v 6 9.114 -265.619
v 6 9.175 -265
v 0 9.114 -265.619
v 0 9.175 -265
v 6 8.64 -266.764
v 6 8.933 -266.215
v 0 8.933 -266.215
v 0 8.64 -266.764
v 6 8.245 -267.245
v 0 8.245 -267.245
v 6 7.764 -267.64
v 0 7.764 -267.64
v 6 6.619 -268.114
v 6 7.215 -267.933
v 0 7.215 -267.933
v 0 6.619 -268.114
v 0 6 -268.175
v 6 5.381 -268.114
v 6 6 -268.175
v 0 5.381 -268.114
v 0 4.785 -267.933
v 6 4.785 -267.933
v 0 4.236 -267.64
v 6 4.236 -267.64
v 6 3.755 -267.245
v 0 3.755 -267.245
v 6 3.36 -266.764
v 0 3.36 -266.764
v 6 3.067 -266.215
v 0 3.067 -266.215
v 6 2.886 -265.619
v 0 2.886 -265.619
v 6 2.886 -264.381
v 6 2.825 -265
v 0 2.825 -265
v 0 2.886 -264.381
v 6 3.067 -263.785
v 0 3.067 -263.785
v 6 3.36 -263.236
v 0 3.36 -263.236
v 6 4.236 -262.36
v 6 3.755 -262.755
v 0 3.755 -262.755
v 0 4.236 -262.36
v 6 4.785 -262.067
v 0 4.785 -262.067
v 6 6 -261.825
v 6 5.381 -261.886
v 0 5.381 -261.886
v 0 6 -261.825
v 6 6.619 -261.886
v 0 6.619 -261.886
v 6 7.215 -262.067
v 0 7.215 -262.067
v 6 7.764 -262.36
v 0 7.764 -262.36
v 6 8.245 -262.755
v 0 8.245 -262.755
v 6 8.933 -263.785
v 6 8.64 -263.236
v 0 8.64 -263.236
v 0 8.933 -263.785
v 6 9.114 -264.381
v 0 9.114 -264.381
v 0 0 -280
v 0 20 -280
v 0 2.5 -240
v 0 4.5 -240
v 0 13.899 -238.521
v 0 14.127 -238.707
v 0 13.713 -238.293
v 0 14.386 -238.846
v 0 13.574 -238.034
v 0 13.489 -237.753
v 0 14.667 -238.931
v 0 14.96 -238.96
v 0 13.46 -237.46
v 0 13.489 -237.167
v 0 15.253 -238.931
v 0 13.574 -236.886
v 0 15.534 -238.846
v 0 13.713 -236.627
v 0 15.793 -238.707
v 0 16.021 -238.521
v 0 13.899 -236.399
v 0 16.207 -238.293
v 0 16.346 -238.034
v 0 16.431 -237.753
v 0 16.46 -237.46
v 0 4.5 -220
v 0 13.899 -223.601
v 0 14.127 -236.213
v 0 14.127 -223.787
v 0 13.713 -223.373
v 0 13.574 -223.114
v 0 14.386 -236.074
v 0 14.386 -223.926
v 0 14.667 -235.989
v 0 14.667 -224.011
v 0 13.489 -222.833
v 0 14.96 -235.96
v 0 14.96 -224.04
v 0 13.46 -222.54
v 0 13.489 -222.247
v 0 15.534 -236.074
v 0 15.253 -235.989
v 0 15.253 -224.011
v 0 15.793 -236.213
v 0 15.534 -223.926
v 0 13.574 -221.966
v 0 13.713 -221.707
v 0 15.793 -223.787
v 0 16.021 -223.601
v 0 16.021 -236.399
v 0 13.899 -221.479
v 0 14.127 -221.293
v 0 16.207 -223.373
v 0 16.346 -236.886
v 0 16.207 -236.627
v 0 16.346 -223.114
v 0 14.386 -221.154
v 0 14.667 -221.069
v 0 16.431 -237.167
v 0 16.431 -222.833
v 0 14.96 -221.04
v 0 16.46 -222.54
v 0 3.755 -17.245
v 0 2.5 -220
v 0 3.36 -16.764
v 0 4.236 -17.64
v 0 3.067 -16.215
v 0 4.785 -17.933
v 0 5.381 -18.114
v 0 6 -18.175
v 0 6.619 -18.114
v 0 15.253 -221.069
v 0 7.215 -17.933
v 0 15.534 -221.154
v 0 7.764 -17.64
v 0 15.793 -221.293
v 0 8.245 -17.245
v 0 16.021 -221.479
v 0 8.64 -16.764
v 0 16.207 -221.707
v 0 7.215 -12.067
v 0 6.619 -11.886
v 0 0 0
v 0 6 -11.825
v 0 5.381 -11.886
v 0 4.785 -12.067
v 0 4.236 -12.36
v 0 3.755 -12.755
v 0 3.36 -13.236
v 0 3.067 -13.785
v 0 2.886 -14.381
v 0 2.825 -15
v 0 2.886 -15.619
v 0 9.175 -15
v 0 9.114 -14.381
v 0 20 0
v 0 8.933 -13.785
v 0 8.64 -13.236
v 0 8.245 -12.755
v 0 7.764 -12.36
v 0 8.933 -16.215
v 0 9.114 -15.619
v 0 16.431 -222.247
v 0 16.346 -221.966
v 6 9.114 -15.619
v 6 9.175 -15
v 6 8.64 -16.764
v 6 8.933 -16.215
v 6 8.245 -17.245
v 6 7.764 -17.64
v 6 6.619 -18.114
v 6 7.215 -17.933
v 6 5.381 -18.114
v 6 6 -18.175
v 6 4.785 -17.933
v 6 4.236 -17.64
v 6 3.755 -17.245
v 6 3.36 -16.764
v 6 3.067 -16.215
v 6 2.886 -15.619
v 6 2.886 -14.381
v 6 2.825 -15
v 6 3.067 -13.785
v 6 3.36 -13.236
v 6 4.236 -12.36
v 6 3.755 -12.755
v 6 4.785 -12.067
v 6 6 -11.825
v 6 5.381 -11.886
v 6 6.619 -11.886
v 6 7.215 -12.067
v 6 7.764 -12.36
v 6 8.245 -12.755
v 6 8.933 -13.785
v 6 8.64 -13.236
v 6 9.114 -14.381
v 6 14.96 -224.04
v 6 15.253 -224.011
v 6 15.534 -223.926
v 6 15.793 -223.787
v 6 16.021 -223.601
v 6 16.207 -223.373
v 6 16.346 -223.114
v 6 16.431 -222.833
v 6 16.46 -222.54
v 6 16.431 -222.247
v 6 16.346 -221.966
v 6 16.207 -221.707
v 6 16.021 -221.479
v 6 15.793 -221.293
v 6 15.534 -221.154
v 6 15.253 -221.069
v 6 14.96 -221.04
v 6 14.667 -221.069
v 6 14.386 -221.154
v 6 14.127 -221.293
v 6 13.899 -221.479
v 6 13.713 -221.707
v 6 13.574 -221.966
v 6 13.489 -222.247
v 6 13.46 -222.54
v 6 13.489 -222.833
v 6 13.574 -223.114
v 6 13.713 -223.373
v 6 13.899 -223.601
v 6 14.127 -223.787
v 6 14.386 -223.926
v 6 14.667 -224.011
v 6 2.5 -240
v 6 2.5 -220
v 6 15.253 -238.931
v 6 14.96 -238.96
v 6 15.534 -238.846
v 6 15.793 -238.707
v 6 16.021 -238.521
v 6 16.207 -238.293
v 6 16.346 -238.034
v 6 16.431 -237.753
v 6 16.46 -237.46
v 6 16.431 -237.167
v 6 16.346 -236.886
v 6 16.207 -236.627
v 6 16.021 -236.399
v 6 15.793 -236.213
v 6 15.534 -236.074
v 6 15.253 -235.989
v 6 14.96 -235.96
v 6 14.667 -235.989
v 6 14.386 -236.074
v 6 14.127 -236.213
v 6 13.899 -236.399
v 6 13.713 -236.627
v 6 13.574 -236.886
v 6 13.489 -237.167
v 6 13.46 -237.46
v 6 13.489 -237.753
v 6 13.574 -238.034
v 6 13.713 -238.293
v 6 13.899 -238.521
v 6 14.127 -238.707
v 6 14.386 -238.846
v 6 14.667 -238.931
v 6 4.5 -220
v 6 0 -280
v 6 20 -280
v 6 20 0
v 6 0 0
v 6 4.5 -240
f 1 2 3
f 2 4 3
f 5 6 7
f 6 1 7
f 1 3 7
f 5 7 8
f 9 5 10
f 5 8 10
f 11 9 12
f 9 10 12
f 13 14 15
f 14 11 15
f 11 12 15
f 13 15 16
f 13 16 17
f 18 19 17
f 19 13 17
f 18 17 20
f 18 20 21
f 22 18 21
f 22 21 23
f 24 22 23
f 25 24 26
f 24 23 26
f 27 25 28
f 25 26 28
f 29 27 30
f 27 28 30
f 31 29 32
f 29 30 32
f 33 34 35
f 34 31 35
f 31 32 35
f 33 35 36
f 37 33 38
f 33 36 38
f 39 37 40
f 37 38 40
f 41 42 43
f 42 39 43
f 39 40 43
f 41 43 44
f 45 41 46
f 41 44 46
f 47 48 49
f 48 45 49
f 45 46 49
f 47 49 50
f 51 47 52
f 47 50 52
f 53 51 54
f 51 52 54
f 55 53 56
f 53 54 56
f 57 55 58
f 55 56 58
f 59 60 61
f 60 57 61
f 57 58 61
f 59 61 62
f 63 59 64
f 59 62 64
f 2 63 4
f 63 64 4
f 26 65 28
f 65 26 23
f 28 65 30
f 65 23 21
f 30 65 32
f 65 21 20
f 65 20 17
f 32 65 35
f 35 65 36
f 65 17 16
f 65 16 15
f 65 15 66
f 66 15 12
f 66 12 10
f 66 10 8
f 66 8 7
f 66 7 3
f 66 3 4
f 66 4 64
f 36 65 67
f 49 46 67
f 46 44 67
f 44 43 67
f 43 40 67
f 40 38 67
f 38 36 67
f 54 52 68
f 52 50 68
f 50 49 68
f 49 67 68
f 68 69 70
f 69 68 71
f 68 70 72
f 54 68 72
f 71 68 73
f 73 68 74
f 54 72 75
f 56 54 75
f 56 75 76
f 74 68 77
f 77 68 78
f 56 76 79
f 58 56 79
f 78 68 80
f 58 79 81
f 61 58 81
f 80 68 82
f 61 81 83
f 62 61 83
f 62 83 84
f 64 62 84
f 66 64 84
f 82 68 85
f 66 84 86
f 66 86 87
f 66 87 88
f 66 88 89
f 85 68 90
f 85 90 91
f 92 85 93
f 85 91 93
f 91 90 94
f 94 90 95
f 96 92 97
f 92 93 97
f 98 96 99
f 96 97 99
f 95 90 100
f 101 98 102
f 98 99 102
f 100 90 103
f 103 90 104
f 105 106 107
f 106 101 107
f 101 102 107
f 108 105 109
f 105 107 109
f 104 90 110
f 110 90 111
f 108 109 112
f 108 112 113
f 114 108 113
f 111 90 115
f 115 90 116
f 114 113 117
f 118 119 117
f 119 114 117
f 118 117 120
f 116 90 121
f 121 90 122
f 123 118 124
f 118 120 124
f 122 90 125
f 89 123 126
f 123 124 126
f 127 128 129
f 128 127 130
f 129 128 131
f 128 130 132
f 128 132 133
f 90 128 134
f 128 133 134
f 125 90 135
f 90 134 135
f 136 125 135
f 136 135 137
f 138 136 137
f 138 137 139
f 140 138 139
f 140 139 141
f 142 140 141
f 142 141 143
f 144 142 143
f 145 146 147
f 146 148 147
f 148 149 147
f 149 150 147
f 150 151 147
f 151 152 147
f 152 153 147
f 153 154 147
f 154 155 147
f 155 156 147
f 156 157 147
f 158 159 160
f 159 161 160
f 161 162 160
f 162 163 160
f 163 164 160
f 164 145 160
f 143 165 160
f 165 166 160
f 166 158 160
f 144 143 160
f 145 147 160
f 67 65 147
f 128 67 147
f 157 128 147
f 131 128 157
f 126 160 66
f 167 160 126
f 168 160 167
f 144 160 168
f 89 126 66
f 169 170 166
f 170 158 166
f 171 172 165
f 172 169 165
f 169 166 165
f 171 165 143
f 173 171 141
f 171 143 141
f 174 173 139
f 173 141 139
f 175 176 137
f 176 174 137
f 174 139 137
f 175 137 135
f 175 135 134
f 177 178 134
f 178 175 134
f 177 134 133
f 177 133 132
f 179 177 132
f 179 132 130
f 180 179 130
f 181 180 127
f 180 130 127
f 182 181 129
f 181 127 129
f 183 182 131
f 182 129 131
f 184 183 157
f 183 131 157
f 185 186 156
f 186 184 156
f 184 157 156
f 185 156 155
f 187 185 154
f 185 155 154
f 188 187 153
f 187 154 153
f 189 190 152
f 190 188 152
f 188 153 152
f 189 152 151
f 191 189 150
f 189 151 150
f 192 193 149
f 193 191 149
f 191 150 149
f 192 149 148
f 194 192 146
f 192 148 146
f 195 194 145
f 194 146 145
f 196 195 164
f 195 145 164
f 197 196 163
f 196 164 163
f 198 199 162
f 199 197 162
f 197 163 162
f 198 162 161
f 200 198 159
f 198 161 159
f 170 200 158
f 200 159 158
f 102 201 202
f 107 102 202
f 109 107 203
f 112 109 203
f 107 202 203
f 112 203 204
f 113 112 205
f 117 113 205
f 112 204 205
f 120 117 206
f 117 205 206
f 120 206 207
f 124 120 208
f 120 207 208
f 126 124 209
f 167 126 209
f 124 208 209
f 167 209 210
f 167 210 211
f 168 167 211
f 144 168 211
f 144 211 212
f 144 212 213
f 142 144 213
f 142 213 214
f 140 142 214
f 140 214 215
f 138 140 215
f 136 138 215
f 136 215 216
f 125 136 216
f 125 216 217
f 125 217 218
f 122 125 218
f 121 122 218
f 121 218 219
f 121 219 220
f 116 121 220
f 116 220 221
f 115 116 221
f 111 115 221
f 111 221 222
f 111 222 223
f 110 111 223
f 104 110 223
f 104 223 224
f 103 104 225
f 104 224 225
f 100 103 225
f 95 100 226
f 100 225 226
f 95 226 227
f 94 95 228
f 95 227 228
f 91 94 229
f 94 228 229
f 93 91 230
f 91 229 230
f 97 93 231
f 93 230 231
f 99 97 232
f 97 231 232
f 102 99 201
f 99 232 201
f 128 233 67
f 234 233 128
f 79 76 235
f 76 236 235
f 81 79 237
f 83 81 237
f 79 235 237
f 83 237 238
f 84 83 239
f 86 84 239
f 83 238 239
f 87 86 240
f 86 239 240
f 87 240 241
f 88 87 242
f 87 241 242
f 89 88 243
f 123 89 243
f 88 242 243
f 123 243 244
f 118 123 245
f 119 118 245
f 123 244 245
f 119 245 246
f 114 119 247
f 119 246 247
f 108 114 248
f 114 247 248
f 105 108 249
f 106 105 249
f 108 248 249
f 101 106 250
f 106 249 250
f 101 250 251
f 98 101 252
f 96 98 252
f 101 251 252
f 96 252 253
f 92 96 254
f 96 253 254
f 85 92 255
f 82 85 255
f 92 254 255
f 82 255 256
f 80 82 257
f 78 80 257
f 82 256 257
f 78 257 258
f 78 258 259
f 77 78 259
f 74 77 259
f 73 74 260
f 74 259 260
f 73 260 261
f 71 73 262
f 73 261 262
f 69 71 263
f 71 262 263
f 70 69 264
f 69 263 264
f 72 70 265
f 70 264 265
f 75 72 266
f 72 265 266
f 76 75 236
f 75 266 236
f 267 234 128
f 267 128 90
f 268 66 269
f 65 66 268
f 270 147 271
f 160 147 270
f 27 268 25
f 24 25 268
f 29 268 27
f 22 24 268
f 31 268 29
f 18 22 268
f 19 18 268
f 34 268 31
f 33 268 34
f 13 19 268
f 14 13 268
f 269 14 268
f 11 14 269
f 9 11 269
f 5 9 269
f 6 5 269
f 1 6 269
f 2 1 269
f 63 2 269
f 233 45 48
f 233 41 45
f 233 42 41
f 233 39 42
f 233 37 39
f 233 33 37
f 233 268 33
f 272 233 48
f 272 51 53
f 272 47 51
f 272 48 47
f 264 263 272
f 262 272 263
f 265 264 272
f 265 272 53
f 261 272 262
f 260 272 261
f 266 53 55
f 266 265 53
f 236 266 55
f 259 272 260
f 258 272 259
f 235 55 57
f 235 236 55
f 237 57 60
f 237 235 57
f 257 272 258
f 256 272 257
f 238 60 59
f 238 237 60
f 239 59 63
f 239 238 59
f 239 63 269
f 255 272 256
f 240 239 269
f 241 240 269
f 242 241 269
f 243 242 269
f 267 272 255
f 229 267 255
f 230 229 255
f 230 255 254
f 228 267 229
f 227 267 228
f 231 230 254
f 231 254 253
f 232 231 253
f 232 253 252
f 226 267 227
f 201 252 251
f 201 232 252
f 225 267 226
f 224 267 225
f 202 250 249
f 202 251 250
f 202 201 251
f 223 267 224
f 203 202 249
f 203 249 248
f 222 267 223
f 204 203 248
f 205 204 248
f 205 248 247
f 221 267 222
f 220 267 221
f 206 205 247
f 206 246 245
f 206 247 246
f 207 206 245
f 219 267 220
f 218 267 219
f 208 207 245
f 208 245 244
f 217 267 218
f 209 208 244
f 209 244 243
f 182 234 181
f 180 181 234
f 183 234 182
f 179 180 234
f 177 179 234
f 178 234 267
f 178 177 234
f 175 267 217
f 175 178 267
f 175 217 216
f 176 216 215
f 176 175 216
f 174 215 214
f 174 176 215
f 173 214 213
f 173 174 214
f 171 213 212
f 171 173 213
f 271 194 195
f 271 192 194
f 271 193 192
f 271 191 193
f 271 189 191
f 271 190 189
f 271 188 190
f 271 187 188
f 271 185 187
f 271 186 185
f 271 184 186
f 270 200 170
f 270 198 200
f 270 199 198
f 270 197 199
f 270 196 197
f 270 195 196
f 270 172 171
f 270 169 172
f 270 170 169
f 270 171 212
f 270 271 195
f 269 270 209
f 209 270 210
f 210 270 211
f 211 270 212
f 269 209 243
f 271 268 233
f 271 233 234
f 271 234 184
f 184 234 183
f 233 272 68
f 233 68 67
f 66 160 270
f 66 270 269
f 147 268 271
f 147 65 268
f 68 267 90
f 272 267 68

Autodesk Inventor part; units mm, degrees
ref_plane "YZ Plane" through (0, 0, 0) normal (1, 0, 0) x (0, 1, 0)
ref_plane "XZ Plane" through (0, 0, 0) normal (0, 1, 0) x (-1, 0, 0)
ref_plane "XY Plane" through (0, 0, 0) normal (0, 0, 1) x (1, 0, 0)
sketch "Boceto1" plane through (0, 0, 0) normal (1, 0, 0) x (0, 1, 0)
  line L0 (0, 0) -> (20, 0)
  line L1 (20, 0) -> (20, -280)
  line L2 (20, -280) -> (0, -280)
  line L3 (0, -280) -> (0, 0)
  circle A0 centre (6, -15) radius 3.175
  circle A1 centre (6, -265) radius 3.175
  dimension "d0" = 20
  dimension "d1" = 280
  dimension "d2" = 6.35
  dimension "d8" = 6
  dimension "d9" = 250
  dimension "d10" = 15
extrude "Extrusión1" add sketch "Boceto1" along normal blind 6
sketch "Boceto2" plane through (6, 0, 0) normal (1, 0, 0) x (0, 0, -1)
  line L0 (220, 17.5) -> (240, 17.5)
  line L1 (240, 17.5) -> (240, 2.5)
  line L2 (240, 2.5) -> (220, 2.5)
  line L3 (220, 2.5) -> (220, 17.5)
  line L4 (280, 0) -> (280, 20) projected
  line L5 (240, 2.5) -> (220, 2.5)
  line L6 (220, 2.5) -> (220, 4.5)
  line L7 (220, 4.5) -> (240, 4.5)
  line L8 (240, 4.5) -> (240, 2.5)
  circle A0 centre (222.54, 14.96) radius 1.5
  line L9 (230, 17.5) -> (230, 4.5)
  circle A1 centre (237.46, 14.96) radius 1.5
  point P0 (0, 0)
  point P1 (240, 10)
  point P2 (280, 10)
  dimension "d11" = 20
  dimension "d12" = 15
  dimension "d13" = 40
  dimension "d14" = 2
  dimension "d15" = 3
  dimension "d16" = 2.54
  dimension "d17" = 2.54
extrude "Extrusión2" cut sketch "Boceto2" against normal through all contours L7 L1 L2 L3 | A0 | A1
properties part number "Riel_Lateral_MDF"
